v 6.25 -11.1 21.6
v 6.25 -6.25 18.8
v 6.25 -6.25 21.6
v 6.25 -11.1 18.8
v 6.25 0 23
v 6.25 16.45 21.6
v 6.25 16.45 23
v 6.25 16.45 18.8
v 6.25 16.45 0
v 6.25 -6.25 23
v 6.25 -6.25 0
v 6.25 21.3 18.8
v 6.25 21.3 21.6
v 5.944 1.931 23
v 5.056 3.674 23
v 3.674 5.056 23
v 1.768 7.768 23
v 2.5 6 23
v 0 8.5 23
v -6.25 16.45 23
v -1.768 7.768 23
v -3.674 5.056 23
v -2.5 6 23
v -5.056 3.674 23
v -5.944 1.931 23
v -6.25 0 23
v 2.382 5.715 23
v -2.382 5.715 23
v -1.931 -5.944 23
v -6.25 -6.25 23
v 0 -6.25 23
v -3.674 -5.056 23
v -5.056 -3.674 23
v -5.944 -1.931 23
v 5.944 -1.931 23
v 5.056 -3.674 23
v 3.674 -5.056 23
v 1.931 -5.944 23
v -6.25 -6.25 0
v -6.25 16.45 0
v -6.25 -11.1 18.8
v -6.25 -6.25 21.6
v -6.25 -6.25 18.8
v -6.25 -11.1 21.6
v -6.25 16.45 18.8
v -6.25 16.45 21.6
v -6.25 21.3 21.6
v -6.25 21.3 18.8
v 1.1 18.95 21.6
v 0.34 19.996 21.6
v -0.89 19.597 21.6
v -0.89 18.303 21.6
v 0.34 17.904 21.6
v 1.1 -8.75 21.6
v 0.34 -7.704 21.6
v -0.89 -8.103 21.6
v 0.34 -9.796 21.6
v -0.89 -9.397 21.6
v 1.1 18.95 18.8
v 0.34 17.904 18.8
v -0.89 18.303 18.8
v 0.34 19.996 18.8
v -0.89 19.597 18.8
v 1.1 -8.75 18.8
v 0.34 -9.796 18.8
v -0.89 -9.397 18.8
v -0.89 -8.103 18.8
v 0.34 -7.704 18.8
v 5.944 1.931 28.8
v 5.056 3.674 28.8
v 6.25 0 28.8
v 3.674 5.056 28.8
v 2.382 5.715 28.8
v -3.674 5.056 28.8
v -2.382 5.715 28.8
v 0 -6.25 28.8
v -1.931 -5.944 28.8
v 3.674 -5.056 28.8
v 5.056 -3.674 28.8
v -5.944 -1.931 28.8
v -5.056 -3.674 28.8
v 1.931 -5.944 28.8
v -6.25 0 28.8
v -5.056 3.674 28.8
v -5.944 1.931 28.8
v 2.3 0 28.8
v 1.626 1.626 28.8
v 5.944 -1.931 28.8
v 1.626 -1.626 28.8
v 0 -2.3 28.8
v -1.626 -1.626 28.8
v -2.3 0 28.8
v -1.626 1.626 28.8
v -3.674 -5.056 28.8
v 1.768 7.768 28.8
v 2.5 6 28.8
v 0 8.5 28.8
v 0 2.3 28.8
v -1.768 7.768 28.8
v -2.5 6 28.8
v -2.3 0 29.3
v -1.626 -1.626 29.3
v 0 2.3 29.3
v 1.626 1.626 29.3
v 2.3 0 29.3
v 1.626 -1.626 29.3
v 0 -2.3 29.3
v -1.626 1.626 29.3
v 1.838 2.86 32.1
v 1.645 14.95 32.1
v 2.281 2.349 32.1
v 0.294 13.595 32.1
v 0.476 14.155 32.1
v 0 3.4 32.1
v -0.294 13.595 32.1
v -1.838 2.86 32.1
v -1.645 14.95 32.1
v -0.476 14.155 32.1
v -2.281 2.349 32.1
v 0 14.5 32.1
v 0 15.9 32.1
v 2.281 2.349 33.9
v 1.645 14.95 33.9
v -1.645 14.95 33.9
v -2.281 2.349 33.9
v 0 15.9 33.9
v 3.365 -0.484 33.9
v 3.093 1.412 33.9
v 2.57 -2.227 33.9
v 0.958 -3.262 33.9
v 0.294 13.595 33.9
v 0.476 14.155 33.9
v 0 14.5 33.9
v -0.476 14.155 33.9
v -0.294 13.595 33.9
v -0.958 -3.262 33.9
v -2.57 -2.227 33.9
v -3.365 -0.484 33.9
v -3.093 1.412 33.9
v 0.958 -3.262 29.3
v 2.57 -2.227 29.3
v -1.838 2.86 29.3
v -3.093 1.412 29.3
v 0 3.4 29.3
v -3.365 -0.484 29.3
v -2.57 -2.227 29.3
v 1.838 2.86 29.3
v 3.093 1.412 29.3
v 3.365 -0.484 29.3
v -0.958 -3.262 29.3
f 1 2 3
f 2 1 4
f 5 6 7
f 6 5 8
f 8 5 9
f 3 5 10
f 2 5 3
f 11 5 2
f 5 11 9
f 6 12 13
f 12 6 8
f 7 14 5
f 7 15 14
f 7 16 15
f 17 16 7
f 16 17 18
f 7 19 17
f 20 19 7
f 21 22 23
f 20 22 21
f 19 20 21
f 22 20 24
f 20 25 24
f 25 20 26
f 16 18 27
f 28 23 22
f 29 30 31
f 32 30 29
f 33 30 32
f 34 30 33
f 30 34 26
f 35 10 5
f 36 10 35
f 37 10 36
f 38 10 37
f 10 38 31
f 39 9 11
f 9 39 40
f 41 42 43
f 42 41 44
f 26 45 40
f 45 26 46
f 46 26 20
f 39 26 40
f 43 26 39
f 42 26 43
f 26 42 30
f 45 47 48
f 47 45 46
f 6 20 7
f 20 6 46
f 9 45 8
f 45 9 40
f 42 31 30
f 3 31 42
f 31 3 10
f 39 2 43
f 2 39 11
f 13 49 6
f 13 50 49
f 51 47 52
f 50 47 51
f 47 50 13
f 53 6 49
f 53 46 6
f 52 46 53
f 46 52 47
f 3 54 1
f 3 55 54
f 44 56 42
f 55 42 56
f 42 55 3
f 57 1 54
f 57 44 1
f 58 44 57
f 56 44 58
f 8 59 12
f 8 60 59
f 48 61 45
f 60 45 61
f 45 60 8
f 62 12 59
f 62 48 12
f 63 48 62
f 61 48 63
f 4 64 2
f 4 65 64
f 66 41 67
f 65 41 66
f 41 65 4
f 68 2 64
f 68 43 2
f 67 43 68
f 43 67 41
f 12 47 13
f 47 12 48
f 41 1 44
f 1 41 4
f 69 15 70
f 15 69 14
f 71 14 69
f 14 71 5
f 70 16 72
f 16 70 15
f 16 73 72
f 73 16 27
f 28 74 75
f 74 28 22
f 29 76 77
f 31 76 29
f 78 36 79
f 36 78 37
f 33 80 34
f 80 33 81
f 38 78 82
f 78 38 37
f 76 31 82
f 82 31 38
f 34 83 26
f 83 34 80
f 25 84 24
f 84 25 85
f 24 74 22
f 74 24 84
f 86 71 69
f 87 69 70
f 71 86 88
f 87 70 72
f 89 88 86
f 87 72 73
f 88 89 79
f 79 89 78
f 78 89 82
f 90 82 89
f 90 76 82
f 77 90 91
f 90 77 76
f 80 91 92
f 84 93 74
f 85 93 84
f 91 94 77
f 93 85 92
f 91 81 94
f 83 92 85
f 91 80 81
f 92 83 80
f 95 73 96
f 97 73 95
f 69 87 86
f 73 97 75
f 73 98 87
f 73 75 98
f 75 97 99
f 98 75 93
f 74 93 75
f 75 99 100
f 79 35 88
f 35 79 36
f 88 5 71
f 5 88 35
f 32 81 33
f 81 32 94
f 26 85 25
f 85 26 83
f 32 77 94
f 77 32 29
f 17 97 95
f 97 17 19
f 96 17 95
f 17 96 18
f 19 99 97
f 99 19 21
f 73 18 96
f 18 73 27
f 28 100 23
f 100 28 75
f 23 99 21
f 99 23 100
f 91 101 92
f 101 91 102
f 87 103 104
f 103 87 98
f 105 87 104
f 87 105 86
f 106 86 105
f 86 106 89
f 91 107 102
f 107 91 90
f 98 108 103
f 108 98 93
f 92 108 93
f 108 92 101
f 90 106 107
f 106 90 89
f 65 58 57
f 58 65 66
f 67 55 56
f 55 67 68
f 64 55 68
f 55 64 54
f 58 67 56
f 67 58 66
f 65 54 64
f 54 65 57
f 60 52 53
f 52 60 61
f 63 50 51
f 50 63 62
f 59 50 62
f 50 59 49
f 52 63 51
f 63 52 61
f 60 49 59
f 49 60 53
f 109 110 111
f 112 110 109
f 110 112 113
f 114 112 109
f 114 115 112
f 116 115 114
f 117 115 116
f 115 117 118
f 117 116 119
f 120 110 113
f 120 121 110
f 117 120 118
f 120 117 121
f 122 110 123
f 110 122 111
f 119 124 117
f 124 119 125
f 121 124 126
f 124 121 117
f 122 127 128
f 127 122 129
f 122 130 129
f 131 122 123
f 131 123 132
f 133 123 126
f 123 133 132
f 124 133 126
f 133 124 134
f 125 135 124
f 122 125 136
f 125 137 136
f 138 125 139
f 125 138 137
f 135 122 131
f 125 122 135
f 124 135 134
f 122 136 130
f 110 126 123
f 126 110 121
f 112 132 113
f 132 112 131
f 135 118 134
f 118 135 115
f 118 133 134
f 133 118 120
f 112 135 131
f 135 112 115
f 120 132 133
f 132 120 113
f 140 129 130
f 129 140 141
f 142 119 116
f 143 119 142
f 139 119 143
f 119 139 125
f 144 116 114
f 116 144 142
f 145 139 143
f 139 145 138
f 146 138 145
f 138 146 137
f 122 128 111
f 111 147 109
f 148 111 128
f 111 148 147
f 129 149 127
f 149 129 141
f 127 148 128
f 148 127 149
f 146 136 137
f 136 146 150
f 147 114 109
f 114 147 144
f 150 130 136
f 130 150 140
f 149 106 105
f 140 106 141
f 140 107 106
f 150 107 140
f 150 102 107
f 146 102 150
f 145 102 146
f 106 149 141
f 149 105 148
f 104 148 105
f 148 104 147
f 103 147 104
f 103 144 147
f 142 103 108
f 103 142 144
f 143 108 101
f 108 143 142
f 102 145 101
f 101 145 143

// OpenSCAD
servo_body_size = [ 12.5, 22.7 ];
servo_body_height = 23;
servo_body_lower_part_height = 18.5;
servo_mount_length = 32.4;
servo_mount_ear_width = (servo_mount_length - servo_body_size[1]) / 2;
servo_mount_thickness = 2.8;
servo_mount_z_pos = 18.8;
servo_tower_height = 5.8;
servo_shaft_dia = 4.6;
servo_shaft_length = 3.9;
servo_mount_hole_dia = 2.2;
servo_mount_screw_hole_dia = 1; // used for mounting_holes == integer
servo_mount_hole_offset = 2.5;
servo_mount_to_top_distance = 12.8;
servo_shaft_offset_from_center = servo_body_size[0];
servo_height_with_horn = 34;

servo_horn_base_dia = 6.8;
servo_horn_base_thickness = 4.6;
servo_horn_horn_base_dia = 4.8;
servo_horn_horn_end_dia = 3.8;
servo_horn_horn_thickness = 1.8;
servo_horn_length = 14;

module MG90S_servo(oversize_xy = 0, mounting_holes = true, horn_angle = 0, rod_link = false) {
  /*translate([(servo_body_size[0] + 2 * oversize_xy) / 2, 0, 0]) difference() {*/
  translate([0, -(servo_body_size[0] + 2 * oversize_xy) / 2, 0]) difference() {
    union() {
      translate([0, (servo_body_size[1] + 2 * oversize_xy) / 2, 0]) {
	translate([0, 0, servo_body_height / 2]) cube([servo_body_size[0] + 2 * oversize_xy, servo_body_size[1] + 2 * oversize_xy, servo_body_height], center=true);
	translate([0, 0, servo_mount_thickness / 2 + servo_mount_z_pos]) cube([servo_body_size[0] + 2 * oversize_xy, servo_mount_length + 2 * oversize_xy, servo_mount_thickness], center=true);
      }
      translate([0, (servo_body_size[0] + 2 * oversize_xy) / 2, servo_body_height]) union() {
	cylinder(d=servo_body_size[0] + 2 * oversize_xy, h=servo_tower_height);
	translate([0, 6, 0]) cylinder(d=5 + 2 * oversize_xy, h=servo_tower_height);
	translate([0, 0, servo_tower_height]) cylinder(d=servo_shaft_dia + 2 * oversize_xy, h=servo_shaft_length);
      }
    }
    if ((oversize_xy == 0) && (mounting_holes == true)) for (yoff = [-servo_mount_hole_offset, servo_body_size[1] + servo_mount_hole_offset]) translate([0, yoff, 0]) cylinder(d=servo_mount_hole_dia, h=servo_body_height);
  }
  if ((mounting_holes != true) && (mounting_holes != false)) for (yoff = [-servo_mount_hole_offset, servo_body_size[1] + servo_mount_hole_offset]) translate([0, yoff - 1 * (servo_body_size[0] + 2 * oversize_xy) / 2, servo_mount_z_pos - mounting_holes]) cylinder(d=servo_mount_screw_hole_dia, h=servo_mount_thickness + 2 * mounting_holes);
  if (horn_angle != false) translate([0, 0, 28.8 + 0.5]) {
    rotate(90 + horn_angle) mirror([0, 0, 1]) translate([0, 0, -servo_horn_base_thickness]) servo_horn();
    if (rod_link) translate([-servo_horn_length * sin(horn_angle), 0 * servo_horn_length + servo_horn_length * cos(horn_angle), servo_horn_base_thickness - servo_horn_horn_thickness / 2]) servo_rod_link();
  }
}
MG90S_servo();
/*MG90S_servo(2 * tol);*/
/*MG90S_servo(2 * tol, 4);*/
/*!MG90S_servo(0, true, 35);*/
/*!rotate([90, 0, 0]) rotate(180) MG90S_servo(0, true, 35);*/
/*!translate([0, servo_body_size[0] / 2 + 1 * (servo_mount_length - servo_body_size[1]) / 2, 0]) MG90S_servo(0, true, 0);*/
/*!translate([0, 0, servo_body_size[0] + (servo_mount_length - servo_body_size[1]) / 2]) rotate([90, 0, 0]) rotate(180) MG90S_servo(0, true, 0);*/

module servo_horn(show_base = true) {
  if (show_base) cylinder(d=servo_horn_base_dia, h=servo_horn_base_thickness);
  difference() {
    hull() {
      cylinder(d=servo_horn_horn_base_dia, h=servo_horn_horn_thickness);
      translate([servo_horn_length, 0, 0]) cylinder(d=servo_horn_horn_end_dia, h=servo_horn_horn_thickness);
    }
    translate([servo_horn_length, 0, -1]) cylinder(d=1, h=servo_horn_horn_thickness + 2);
  }
}
/*!servo_horn();*/
